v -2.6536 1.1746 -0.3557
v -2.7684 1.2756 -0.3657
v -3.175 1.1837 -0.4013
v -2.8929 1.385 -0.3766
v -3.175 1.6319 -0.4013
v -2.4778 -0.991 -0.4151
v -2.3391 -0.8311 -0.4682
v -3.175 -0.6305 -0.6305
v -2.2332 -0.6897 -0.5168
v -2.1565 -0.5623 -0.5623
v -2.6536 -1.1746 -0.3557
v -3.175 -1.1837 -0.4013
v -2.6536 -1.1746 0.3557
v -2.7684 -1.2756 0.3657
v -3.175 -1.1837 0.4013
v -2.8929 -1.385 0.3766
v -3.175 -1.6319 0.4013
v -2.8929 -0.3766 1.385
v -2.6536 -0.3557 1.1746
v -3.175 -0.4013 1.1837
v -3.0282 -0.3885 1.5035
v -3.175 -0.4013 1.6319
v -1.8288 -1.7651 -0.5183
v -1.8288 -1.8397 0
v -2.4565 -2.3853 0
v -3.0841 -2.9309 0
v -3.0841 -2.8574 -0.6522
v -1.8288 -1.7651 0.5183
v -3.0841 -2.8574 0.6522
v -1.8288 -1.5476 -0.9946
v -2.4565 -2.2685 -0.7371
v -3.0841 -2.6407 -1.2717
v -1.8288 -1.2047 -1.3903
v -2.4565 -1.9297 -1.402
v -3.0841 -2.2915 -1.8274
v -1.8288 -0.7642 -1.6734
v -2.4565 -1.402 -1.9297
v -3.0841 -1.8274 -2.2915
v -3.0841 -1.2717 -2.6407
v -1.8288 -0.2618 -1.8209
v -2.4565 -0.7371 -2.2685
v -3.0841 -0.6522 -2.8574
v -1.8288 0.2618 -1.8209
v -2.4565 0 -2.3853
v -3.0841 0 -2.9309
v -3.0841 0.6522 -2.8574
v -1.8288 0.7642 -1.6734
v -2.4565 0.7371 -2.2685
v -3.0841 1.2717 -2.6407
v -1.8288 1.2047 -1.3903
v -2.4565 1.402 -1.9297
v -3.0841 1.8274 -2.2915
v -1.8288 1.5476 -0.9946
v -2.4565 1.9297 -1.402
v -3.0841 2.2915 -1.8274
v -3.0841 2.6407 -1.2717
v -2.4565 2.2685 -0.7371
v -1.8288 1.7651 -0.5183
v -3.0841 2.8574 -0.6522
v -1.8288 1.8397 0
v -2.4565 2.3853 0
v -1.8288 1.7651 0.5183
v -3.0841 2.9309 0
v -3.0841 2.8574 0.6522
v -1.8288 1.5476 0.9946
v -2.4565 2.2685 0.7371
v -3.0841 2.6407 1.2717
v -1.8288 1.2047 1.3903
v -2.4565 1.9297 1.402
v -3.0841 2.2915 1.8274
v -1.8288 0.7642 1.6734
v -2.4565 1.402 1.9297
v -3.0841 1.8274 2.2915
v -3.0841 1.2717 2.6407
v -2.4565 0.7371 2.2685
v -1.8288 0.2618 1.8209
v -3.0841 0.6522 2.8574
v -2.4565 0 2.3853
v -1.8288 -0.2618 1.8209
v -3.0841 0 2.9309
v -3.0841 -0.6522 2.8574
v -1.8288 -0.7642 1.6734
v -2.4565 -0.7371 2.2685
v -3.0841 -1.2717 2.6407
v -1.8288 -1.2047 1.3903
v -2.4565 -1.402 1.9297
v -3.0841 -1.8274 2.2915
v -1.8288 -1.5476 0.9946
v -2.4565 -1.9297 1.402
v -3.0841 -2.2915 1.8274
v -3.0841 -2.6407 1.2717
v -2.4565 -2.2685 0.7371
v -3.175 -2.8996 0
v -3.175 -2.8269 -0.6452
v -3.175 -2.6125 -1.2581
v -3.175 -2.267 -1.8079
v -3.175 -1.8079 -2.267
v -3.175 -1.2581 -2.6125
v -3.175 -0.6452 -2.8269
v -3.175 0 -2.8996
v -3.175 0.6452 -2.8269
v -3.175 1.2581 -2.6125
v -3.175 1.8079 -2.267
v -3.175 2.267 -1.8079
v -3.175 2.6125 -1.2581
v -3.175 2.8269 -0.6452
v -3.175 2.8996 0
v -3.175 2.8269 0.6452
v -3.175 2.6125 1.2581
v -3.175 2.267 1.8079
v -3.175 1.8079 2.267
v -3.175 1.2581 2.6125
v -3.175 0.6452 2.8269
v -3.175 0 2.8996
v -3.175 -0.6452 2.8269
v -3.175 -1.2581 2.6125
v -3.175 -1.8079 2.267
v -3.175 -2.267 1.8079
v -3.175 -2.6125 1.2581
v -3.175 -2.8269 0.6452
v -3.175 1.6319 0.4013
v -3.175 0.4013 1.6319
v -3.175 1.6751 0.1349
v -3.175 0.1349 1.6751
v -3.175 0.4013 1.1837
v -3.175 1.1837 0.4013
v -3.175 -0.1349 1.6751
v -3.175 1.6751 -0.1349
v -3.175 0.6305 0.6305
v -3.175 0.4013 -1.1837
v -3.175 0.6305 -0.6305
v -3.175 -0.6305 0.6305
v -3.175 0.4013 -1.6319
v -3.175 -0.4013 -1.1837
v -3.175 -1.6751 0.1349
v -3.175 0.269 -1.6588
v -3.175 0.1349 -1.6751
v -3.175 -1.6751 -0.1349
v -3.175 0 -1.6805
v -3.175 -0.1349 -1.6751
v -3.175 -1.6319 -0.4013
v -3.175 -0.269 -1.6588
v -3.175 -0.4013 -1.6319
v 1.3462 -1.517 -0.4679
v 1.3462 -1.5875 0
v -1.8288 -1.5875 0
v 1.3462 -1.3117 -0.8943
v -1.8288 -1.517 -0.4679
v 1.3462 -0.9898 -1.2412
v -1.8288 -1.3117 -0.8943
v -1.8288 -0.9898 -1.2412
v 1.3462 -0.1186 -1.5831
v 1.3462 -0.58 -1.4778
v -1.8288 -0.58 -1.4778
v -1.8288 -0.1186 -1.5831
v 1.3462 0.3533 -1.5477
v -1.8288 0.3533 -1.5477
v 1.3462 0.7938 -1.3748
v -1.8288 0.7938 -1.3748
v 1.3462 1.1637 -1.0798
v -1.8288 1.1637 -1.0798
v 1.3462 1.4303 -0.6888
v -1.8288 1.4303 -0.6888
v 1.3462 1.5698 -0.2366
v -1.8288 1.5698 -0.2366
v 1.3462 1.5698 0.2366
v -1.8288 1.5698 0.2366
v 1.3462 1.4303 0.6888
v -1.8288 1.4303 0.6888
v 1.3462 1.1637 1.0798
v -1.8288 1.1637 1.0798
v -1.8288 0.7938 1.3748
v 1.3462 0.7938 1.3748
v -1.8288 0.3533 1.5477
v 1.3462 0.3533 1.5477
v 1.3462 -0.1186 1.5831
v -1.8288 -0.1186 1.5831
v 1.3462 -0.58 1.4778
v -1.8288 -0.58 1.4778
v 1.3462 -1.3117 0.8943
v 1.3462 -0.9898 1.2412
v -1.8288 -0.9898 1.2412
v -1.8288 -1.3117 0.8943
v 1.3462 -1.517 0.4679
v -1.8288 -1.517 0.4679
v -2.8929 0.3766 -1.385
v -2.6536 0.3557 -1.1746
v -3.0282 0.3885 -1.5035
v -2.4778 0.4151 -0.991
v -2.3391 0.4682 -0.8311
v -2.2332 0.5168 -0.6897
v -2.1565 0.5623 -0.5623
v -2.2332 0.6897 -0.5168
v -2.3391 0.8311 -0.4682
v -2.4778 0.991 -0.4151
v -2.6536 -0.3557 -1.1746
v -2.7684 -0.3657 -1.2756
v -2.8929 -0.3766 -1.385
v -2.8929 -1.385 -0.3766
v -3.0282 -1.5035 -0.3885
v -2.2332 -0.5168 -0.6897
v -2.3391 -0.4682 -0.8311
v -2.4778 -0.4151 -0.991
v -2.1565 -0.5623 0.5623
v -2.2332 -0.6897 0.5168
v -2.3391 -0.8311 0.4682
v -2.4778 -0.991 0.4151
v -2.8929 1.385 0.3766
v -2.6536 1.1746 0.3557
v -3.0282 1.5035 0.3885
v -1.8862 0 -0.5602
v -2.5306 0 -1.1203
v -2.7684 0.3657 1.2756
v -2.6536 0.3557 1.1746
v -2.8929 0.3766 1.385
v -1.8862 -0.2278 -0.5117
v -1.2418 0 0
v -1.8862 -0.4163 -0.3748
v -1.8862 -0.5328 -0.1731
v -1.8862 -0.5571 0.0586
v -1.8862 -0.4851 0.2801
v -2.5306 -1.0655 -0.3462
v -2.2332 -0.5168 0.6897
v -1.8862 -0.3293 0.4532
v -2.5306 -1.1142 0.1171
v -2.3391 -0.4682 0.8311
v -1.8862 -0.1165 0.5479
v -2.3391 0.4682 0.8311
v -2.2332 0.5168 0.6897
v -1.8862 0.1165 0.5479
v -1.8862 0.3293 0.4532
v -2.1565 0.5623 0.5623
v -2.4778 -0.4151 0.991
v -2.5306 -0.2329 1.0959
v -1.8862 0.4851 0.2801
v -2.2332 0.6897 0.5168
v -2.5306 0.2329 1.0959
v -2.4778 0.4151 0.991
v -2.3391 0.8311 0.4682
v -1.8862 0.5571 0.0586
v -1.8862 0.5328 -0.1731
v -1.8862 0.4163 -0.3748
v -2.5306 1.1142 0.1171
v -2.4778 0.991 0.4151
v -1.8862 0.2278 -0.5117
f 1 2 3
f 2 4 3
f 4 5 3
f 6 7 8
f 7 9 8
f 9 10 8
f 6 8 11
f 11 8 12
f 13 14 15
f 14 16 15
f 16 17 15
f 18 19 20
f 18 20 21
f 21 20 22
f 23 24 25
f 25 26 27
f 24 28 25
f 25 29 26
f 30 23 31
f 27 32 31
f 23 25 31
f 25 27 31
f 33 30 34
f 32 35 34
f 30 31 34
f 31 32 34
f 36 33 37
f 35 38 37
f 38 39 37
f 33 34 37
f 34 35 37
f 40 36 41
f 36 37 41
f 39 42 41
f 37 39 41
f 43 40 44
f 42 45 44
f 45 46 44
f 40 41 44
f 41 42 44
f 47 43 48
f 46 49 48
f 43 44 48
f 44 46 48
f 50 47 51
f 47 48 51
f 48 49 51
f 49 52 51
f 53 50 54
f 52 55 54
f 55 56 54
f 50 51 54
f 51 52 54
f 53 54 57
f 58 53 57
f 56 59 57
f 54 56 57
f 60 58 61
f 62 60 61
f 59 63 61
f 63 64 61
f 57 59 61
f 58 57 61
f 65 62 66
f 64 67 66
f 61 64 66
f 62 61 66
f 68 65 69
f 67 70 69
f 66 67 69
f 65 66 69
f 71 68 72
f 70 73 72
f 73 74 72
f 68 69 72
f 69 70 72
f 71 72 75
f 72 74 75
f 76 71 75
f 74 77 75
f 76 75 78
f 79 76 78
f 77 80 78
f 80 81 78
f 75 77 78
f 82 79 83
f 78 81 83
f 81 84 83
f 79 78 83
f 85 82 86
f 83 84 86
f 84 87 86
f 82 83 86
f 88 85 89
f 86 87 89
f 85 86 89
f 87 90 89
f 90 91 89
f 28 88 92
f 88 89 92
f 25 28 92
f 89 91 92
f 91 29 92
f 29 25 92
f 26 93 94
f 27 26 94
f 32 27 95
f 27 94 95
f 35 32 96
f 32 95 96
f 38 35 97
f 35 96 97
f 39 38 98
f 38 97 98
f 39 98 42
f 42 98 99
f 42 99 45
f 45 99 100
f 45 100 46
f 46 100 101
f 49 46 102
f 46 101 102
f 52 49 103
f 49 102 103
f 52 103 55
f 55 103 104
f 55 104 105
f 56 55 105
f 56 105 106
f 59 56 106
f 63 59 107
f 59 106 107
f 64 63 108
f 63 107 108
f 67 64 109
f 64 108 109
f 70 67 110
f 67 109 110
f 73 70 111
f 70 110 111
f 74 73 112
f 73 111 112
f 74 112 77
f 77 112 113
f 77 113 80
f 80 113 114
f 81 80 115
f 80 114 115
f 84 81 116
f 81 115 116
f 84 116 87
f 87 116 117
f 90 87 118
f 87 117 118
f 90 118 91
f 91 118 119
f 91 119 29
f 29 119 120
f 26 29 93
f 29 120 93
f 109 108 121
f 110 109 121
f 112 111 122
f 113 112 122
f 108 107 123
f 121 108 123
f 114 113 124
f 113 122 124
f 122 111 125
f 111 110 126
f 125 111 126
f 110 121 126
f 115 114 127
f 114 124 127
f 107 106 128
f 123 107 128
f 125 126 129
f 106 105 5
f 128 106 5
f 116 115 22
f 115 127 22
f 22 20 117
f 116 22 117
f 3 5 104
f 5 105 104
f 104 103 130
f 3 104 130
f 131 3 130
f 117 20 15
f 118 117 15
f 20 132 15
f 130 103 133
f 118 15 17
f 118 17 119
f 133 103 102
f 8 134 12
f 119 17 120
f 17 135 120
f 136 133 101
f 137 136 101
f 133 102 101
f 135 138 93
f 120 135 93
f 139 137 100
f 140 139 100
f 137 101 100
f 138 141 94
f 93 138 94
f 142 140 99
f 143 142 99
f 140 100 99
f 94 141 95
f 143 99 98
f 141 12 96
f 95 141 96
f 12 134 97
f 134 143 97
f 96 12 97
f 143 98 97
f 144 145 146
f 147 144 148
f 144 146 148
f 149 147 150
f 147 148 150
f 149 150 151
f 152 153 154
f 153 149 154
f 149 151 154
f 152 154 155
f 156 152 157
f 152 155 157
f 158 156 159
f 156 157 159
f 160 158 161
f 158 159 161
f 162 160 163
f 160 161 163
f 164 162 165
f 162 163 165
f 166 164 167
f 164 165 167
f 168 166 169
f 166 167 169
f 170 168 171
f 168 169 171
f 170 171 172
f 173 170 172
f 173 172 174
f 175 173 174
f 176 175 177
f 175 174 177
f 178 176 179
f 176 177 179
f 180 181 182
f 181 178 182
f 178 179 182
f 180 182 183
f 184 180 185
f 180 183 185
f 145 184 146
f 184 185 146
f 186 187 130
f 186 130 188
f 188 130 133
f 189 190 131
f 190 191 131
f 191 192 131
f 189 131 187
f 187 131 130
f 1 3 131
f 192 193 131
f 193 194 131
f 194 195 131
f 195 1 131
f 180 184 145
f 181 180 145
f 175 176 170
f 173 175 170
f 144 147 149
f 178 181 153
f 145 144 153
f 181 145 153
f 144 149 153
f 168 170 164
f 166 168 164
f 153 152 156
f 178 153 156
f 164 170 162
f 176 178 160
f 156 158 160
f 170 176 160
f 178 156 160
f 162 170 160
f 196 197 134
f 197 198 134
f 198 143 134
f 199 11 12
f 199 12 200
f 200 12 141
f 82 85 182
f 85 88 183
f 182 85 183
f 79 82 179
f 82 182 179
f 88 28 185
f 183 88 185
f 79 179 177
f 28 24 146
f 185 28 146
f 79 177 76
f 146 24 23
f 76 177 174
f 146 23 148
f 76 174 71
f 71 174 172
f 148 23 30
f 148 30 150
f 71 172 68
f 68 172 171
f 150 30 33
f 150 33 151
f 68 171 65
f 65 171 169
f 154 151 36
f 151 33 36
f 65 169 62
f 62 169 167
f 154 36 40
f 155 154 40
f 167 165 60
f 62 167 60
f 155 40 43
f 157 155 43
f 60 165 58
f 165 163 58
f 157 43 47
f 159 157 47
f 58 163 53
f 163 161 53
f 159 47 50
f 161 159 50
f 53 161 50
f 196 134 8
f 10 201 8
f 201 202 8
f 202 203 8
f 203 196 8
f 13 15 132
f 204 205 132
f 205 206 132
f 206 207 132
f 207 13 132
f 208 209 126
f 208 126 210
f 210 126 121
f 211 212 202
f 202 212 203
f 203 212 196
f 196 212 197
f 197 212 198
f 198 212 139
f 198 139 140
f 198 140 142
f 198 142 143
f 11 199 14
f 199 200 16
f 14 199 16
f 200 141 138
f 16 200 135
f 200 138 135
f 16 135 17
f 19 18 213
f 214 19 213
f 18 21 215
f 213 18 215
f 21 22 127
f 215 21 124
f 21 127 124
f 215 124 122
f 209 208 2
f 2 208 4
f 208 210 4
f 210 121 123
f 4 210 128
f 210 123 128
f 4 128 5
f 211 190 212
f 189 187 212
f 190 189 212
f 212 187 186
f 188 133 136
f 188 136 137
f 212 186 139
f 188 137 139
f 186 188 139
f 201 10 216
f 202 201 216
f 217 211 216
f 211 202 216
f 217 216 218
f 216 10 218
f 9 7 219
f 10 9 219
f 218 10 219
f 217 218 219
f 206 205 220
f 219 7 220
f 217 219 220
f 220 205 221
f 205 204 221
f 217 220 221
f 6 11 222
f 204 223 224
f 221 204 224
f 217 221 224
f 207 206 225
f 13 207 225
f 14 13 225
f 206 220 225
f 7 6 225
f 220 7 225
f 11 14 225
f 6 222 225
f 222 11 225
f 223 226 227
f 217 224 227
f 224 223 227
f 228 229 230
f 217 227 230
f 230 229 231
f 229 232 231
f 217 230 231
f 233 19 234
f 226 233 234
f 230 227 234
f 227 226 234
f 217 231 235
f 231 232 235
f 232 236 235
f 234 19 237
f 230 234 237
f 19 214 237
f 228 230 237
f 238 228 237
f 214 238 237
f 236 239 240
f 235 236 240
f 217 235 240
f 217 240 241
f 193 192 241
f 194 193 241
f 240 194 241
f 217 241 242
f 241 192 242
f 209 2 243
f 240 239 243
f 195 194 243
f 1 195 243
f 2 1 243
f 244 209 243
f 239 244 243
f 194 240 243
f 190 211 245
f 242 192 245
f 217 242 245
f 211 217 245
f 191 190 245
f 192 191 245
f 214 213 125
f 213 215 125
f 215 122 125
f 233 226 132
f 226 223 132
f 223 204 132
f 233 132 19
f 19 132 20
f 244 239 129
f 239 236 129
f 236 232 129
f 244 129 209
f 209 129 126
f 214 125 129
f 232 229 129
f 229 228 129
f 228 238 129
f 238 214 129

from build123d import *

# Parameters (mm, degrees)
CUT_EXTRUDE1_REACH          = 9.645
CIRPATTERN1_COUNT           = 4
DRAFT1_ANGLE                = 5
CHAMFER1_SIZE               = 0.120396
CHAMFER1_SIZE2              = 0.110273872
SKETCH8_W                   = 2.54
SKETCH8_H                   = 5.08
SCREW_SHORTENING_DEPTH      = 6.221219053
SCREW_SHORTENING_DEPTH_BACK = 6.221219053


with BuildPart() as part:
    # Sketch2 → Revolve1 (revolve)
    with BuildSketch(Plane.XY, mode=Mode.PRIVATE) as revolve1_sk:
        Polygon((-3.175, 0), (3.175, 0), (3.175, 1.5875), (-1.8288, 1.5875), (-1.8288, 1.839666194), (-3.175, 3.0099), align=None)
    revolve(revolve1_sk.sketch.rotate(Axis((-3.175, 0, 0), (1, 0, 0)), 180), axis=Axis((-3.175, 0, 0), (1, 0, 0)))

    # Cut-Extrude1: up to this cone (the profile starts inside it)
    cut_extrude1_end = Plane(origin=(-3.175, 0, 0), z_dir=(-1, 0, 0)).offset(-1.933209747) * Cone(1e-06, 11.960277355, 13.758724211, align=(Align.CENTER, Align.CENTER, Align.MIN), mode=Mode.PRIVATE)
    # Sketch3 → Cut-Extrude1 (cut, up to the surface)
    with BuildSketch(Plane.ZY.offset(3.175), mode=Mode.PRIVATE) as cut_extrude1_sk1:
        with BuildLine():
            Line((0, 0), (2.0066, 0))
            ThreePointArc((2.0066, 0), (1.996438885, 0.201681283), (1.966058447, 0.40132))
            Line((1.966058447, 0.40132), (1.183689224, 0.40132))
            Line((1.183689224, 0.40132), (0.63047064, 0.63047064))
            Line((0.63047064, 0.63047064), (0.40132, 1.183689224))
            Line((0.40132, 1.183689224), (0.40132, 1.966058447))
            ThreePointArc((0.40132, 1.966058447), (0.201681283, 1.996438885), (0, 2.0066))
            Line((0, 2.0066), (0, 0))
        make_face()
    cut_extrude1_tool1 = extrude(cut_extrude1_sk1.sketch, amount=-CUT_EXTRUDE1_REACH, mode=Mode.PRIVATE) & cut_extrude1_end
    cut_extrude1 = cut_extrude1_tool1.solids().sort_by_distance((-3.175, 1.0033, 0.028378))[0]
    add(cut_extrude1, mode=Mode.SUBTRACT)

    # CirPattern1: Cut-Extrude1 ×4 about axis
    cirpattern1_axis = Axis((0, 0, 0), (1, 0, 0))
    for i in range(1, CIRPATTERN1_COUNT):
        add(cut_extrude1.rotate(cirpattern1_axis, i * 360 / CIRPATTERN1_COUNT), mode=Mode.SUBTRACT)

    # Draft1
    draft1_faces = [part.faces().sort_by_distance(p)[0] for p in [
        (-3.009498029, 0.40132, -1.333367825),
        (-2.803736683, 0.526902447, -0.880506376),
        (-2.803736683, 0.880506376, -0.526902447),
        (-3.009498029, 1.333367825, -0.40132),
        (-3.009498029, 1.333367825, 0.40132),
        (-2.803736683, 0.880506376, 0.526902447),
        (-2.803736683, 0.526902447, 0.880506376),
        (-3.009498029, 0.40132, 1.333367825),
        (-3.009498029, -0.40132, 1.333367825),
        (-2.803736683, -0.526902447, 0.880506376),
        (-2.803736683, -0.880506376, 0.526902447),
        (-3.009498029, -1.333367825, 0.40132),
        (-3.009498029, -1.333367825, -0.40132),
        (-2.803736683, -0.880506376, -0.526902447),
        (-2.803736683, -0.526902447, -0.880506376),
        (-3.009498029, -0.40132, -1.333367825),
    ]]
    draft(draft1_faces, Plane(origin=(-3.175, 0, 0), x_dir=(0, -1, 0), z_dir=(-1, 0, 0)), DRAFT1_ANGLE)

    # Chamfer1
    chamfer1_edges = [part.edges().sort_by_distance(p)[0] for p in [
        (-3.175, 3.0099, 0),
    ]]
    chamfer1_side = [part.faces().sort_by_distance(p)[0] for p in [
        (-2.5019, 2.424783097, 0),
    ]]
    chamfer(chamfer1_edges, length=CHAMFER1_SIZE, length2=CHAMFER1_SIZE2, reference=chamfer1_side[0])

    # Sketch8 → Screw Shortening (cut, two sides)
    with BuildSketch(Plane.XY) as screw_shortening_sk:
        with Locations((2.6162, 0)):
            Rectangle(SKETCH8_W, SKETCH8_H)
    extrude(amount=SCREW_SHORTENING_DEPTH, mode=Mode.SUBTRACT)
    extrude(screw_shortening_sk.sketch, amount=-SCREW_SHORTENING_DEPTH_BACK, mode=Mode.SUBTRACT)


solid = part.part
